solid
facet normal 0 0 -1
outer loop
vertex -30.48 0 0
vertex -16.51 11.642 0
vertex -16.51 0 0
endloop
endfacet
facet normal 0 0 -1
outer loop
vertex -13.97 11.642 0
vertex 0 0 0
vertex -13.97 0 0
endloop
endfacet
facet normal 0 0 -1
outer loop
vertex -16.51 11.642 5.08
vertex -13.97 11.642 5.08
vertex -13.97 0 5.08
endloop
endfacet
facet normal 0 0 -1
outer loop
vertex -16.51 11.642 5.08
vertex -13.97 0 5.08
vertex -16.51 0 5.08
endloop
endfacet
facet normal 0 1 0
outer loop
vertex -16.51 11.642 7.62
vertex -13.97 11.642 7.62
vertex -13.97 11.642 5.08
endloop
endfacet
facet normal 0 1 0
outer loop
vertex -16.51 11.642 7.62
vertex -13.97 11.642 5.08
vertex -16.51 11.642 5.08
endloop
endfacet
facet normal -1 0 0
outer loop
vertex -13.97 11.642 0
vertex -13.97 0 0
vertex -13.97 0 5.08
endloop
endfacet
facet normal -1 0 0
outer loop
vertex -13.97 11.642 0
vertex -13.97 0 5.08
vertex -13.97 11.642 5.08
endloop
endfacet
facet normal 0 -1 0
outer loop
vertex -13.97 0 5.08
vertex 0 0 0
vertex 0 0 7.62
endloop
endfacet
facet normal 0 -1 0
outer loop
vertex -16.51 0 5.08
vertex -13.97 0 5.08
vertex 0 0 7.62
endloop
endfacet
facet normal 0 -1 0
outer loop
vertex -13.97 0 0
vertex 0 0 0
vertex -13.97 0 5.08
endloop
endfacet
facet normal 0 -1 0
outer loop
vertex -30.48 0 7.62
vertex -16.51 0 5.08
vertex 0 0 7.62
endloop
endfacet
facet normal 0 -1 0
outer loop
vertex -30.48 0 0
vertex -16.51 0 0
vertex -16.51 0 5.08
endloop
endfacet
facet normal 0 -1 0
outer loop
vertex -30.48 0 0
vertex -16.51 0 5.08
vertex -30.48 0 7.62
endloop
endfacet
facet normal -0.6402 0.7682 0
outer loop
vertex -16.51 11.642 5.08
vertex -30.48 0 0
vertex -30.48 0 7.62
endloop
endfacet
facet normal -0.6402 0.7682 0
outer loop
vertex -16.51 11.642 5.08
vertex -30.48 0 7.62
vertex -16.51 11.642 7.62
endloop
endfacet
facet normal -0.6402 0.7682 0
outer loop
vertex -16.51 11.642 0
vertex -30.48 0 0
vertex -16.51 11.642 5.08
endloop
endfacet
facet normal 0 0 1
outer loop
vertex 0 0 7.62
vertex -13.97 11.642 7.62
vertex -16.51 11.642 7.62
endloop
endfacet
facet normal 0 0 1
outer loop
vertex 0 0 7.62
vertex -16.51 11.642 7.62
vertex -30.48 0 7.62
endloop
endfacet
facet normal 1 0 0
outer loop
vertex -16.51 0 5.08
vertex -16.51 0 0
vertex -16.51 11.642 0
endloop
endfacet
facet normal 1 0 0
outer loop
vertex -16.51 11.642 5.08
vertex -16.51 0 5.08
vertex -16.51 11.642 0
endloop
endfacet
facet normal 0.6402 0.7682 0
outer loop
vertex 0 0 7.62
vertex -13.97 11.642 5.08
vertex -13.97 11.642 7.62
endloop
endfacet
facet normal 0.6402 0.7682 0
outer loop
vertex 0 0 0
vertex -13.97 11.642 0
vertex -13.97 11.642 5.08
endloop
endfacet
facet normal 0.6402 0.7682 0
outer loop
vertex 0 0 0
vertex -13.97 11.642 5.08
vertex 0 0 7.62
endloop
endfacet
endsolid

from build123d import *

# Parameters (mm, degrees)
BOSS_EXTRUDE1_DEPTH     = 7.62
SKETCH5_W               = 2.54
SKETCH5_H               = 12.7
CUT_EXTRUDE2_DEPTH      = 5.08
CUT_EXTRUDE3_DEPTH      = 34.408483952
CUT_EXTRUDE3_DEPTH_BACK = 34.408483952
SKETCH6_W               = 2.54
SKETCH6_H               = 1.058333333


with BuildPart() as part:
    # Sketch2 → Boss-Extrude1 (new body)
    with BuildSketch(Plane.XY):
        Polygon((0, 0), (-30.48, 0), (-15.24, 12.7), align=None)
    extrude(amount=BOSS_EXTRUDE1_DEPTH)

    # Sketch5 → Cut-Extrude2 (cut)
    with BuildSketch(Plane(origin=(0, 0, 0), x_dir=(-1, 0, 0), z_dir=(0, 0, -1))):
        with Locations((15.24, 6.35)):
            Rectangle(SKETCH5_W, SKETCH5_H)
    extrude(amount=-CUT_EXTRUDE2_DEPTH, mode=Mode.SUBTRACT)

    # Sketch6 → Cut-Extrude3 (cut, two sides: drawn at the far end of the back side and taken through both)
    with BuildSketch(Plane(origin=(0, 0, 5.08), x_dir=(-1, 0, 0), z_dir=(0, 0, -1)).offset(-CUT_EXTRUDE3_DEPTH_BACK)):
        with Locations((15.24, 12.170833334)):
            Rectangle(SKETCH6_W, SKETCH6_H)
    extrude(amount=CUT_EXTRUDE3_DEPTH + CUT_EXTRUDE3_DEPTH_BACK, mode=Mode.SUBTRACT)


solid = part.part
